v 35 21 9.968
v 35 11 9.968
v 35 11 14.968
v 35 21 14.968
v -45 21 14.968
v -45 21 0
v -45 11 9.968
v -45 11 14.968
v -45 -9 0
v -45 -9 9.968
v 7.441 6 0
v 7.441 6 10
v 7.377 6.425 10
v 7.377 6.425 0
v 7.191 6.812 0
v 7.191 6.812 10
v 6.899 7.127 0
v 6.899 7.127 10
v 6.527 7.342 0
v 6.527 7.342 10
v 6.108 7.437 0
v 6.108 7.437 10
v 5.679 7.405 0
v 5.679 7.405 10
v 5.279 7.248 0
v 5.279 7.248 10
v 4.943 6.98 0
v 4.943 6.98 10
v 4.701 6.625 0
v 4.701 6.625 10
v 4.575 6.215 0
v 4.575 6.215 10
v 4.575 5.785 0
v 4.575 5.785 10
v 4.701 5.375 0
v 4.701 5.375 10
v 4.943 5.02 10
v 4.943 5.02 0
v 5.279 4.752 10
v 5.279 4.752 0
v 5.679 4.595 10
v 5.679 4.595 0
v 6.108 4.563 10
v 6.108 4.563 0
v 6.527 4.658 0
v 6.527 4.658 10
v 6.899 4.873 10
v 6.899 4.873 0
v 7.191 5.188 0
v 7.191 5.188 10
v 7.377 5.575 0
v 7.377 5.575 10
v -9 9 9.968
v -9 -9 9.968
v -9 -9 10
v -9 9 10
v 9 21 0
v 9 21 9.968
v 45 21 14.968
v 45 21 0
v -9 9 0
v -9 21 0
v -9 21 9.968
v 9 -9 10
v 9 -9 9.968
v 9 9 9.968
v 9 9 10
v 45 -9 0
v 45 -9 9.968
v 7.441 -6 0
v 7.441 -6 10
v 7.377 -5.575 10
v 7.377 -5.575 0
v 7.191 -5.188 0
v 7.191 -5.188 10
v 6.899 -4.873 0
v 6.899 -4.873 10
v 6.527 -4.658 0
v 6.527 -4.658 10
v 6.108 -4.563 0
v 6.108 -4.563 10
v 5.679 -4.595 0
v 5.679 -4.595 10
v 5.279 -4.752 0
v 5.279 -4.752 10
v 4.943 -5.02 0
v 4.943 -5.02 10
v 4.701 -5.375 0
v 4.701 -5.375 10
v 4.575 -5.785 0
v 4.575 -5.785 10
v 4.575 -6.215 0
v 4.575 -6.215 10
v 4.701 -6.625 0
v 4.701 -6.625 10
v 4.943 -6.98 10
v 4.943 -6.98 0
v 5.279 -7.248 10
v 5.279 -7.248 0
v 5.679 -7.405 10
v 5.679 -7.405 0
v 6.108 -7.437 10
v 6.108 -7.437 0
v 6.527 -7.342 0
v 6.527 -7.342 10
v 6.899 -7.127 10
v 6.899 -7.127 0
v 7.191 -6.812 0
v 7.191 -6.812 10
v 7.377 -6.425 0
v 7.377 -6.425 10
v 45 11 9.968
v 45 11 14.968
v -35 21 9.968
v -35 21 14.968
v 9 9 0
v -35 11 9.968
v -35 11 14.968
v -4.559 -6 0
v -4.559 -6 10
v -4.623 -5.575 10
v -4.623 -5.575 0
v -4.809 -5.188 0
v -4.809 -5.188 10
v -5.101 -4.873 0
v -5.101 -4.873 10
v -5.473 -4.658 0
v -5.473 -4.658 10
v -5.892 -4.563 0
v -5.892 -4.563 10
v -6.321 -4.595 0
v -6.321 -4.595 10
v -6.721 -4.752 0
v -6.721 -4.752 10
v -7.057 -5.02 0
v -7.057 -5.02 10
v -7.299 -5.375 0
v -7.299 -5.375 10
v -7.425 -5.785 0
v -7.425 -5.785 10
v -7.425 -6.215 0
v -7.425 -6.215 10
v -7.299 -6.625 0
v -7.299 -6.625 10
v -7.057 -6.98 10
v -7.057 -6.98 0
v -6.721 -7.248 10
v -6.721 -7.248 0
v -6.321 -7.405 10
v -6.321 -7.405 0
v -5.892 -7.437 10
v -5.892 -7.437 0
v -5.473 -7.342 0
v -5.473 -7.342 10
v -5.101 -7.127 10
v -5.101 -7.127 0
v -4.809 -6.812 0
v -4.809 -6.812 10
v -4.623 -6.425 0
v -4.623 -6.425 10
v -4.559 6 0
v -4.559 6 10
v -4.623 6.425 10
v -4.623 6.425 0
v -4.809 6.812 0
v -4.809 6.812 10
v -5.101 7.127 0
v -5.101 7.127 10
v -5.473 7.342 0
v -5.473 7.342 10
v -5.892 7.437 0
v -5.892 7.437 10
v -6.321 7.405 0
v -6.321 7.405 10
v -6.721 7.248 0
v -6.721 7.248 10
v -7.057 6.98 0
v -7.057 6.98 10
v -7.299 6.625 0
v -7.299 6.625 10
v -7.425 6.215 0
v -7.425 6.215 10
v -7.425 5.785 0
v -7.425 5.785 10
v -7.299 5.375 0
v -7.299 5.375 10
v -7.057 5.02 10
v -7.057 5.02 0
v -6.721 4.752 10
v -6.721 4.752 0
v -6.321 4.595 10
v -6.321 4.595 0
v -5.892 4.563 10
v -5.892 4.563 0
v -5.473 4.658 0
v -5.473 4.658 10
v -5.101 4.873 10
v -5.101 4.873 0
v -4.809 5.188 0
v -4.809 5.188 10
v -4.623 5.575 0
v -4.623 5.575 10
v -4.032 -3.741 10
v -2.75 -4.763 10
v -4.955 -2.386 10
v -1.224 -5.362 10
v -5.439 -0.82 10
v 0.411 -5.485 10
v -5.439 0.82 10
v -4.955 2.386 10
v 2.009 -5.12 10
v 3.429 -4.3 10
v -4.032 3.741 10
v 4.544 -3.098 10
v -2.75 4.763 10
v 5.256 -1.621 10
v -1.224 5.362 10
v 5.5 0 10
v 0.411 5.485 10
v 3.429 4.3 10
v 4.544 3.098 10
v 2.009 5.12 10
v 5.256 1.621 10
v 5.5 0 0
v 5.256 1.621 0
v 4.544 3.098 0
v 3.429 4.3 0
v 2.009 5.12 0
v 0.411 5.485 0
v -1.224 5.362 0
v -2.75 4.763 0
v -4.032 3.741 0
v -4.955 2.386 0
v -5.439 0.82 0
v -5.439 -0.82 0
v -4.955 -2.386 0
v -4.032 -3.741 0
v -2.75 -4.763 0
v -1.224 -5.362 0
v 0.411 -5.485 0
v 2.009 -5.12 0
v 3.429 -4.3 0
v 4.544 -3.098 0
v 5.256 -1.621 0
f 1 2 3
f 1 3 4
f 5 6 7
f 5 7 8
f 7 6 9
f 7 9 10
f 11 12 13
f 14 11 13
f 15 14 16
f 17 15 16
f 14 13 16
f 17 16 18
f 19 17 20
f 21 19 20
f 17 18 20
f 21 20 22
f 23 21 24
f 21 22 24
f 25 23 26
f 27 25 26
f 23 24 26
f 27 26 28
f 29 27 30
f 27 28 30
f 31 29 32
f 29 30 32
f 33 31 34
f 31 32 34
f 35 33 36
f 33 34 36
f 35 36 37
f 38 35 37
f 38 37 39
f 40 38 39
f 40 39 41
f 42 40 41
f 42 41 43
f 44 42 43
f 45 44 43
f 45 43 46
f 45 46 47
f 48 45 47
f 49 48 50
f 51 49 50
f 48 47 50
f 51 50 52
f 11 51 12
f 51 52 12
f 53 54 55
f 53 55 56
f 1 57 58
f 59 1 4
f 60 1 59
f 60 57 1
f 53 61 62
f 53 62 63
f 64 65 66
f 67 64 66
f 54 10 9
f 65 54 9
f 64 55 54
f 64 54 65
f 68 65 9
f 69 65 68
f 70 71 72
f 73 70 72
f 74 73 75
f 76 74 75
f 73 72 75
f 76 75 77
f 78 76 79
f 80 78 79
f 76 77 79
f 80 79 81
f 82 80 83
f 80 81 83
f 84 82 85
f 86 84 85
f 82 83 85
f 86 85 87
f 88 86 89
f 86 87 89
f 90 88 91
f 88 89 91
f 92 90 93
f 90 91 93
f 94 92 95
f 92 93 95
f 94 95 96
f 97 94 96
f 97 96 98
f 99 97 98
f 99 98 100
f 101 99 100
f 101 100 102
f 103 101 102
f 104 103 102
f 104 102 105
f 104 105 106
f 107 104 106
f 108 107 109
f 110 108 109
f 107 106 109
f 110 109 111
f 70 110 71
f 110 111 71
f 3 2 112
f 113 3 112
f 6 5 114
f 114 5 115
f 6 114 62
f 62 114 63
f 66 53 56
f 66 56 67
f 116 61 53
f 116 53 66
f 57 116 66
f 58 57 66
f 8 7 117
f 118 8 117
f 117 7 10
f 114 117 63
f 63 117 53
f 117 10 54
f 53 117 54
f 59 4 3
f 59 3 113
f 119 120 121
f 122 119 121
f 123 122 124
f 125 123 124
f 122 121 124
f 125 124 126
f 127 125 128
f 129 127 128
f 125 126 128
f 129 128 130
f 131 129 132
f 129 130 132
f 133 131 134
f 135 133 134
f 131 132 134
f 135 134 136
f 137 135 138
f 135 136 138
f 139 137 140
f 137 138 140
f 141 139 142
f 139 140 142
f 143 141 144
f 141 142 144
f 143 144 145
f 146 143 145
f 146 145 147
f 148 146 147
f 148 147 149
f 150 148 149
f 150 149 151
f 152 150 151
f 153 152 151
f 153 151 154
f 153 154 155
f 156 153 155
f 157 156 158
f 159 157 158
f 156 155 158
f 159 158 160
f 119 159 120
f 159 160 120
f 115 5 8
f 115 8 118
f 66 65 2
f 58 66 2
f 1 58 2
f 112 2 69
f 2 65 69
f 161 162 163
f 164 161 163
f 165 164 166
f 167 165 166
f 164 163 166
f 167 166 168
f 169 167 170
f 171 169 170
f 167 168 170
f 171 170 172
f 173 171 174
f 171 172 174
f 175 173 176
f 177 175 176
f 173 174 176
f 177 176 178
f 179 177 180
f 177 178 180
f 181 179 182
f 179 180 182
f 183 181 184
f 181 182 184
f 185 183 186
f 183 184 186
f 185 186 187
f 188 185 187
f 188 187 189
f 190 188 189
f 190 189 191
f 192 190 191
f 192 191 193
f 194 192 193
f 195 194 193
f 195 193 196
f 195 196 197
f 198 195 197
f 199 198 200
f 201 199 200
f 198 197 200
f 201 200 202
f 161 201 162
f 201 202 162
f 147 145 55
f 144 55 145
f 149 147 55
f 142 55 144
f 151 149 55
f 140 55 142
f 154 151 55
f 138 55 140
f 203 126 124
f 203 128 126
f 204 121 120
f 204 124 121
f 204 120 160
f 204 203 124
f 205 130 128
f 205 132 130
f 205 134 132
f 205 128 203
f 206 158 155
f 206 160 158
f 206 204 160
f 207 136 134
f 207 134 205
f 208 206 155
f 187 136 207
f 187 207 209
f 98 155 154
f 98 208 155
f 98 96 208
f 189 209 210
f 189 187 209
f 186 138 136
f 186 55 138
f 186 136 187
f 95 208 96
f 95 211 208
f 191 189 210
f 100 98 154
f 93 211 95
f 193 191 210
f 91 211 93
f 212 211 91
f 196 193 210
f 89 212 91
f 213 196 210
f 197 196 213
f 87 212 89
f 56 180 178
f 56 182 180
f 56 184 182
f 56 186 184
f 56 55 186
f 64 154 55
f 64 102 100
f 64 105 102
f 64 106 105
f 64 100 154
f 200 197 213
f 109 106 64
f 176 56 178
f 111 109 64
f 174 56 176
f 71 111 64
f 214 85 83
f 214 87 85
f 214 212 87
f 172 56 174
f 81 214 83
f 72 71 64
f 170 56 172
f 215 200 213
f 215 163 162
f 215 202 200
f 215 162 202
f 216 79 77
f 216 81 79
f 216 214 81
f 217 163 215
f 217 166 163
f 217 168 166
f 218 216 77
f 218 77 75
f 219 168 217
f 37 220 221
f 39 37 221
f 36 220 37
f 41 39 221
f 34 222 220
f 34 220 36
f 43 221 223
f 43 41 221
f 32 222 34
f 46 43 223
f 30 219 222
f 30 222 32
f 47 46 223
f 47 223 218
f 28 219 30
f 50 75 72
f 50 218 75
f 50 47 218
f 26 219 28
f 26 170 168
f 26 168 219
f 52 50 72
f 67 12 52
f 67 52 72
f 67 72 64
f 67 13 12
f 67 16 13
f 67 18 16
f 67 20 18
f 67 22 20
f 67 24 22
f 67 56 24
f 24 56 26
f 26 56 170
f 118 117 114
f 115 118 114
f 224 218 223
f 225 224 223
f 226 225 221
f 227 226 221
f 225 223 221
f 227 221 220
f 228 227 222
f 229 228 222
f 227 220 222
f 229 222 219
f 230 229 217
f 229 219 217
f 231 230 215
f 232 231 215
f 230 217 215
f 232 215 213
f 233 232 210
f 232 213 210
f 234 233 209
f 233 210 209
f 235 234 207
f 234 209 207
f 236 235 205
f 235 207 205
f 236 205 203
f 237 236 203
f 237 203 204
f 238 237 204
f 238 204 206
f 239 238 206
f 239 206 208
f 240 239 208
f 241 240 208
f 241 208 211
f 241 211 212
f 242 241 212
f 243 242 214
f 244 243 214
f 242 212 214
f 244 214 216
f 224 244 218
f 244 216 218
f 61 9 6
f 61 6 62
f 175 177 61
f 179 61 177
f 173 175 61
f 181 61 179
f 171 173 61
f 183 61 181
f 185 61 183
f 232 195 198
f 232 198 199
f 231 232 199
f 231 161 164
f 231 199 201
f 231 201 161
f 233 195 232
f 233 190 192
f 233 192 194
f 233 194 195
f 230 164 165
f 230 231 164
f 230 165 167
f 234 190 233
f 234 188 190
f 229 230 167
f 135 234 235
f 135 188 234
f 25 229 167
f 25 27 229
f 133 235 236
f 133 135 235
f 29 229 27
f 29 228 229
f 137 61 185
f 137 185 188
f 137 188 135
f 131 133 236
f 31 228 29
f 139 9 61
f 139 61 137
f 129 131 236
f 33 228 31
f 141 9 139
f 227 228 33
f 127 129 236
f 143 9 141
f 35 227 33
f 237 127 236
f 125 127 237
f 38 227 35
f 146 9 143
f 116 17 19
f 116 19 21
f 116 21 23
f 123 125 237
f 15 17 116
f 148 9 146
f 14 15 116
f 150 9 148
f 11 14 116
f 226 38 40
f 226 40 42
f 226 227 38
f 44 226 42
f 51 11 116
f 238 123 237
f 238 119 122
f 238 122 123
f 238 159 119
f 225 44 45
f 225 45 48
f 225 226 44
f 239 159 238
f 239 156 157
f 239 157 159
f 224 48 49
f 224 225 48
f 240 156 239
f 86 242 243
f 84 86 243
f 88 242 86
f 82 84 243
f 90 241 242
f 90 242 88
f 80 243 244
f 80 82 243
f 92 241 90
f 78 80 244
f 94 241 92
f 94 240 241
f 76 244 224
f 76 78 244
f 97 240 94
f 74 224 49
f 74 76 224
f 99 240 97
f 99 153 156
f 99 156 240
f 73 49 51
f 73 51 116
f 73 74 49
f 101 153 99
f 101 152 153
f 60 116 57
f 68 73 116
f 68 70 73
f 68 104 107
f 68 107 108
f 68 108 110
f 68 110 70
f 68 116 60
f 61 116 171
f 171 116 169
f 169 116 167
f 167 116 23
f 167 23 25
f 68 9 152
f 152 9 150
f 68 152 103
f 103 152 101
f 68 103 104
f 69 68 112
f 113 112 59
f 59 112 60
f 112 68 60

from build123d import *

# Parameters (mm, degrees)
SKETCH_1_W          = 18
SKETCH_1_H          = 18
EXTRUDE_1_DEPTH     = 10
SKETCH_2_R          = 1.441488503
SKETCH_2_R_2        = 5.5
CUT_EXTRUDE_1_DEPTH = 10
SKETCH_3_W          = 36
SKETCH_3_H          = 9.968006468
EXTRUDE_2_DEPTH     = 30
SKETCH_4_W          = 10
SKETCH_4_H          = 10
EXTRUDE_3_DEPTH     = 5


with BuildPart() as part:
    # 草图1 → 凸台-拉伸1 (new body)
    with BuildSketch(Plane.XY):
        Rectangle(SKETCH_1_W, SKETCH_1_H)
    extrude(amount=EXTRUDE_1_DEPTH)

    # 草图2 → 切除-拉伸1 (cut)
    with BuildSketch(Plane.XY.offset(10)):
        with Locations((-6, 6)):
            Circle(SKETCH_2_R)
        with Locations((6, 6)):
            Circle(SKETCH_2_R)
        with Locations((6, -6)):
            Circle(SKETCH_2_R)
        with Locations((-6, -6)):
            Circle(SKETCH_2_R)
        Circle(SKETCH_2_R_2)
    extrude(amount=-CUT_EXTRUDE_1_DEPTH, mode=Mode.SUBTRACT)

    # 草图3 → 凸台-拉伸2 (add)
    with BuildSketch(Plane.XZ.offset(9)):
        with Locations((-27, 4.984003234)):
            Rectangle(SKETCH_3_W, SKETCH_3_H)
        with Locations((27, 4.984003234)):
            Rectangle(SKETCH_3_W, SKETCH_3_H)
    extrude(amount=-EXTRUDE_2_DEPTH)

    # 草图4 → 凸台-拉伸3 (add)
    with BuildSketch(Plane.XY.offset(9.968006468)):
        with Locations((40, 16)):
            Rectangle(SKETCH_4_W, SKETCH_4_H)
        with Locations((-40, 16)):
            Rectangle(SKETCH_4_W, SKETCH_4_H)
    extrude(amount=EXTRUDE_3_DEPTH)


solid = part.part
